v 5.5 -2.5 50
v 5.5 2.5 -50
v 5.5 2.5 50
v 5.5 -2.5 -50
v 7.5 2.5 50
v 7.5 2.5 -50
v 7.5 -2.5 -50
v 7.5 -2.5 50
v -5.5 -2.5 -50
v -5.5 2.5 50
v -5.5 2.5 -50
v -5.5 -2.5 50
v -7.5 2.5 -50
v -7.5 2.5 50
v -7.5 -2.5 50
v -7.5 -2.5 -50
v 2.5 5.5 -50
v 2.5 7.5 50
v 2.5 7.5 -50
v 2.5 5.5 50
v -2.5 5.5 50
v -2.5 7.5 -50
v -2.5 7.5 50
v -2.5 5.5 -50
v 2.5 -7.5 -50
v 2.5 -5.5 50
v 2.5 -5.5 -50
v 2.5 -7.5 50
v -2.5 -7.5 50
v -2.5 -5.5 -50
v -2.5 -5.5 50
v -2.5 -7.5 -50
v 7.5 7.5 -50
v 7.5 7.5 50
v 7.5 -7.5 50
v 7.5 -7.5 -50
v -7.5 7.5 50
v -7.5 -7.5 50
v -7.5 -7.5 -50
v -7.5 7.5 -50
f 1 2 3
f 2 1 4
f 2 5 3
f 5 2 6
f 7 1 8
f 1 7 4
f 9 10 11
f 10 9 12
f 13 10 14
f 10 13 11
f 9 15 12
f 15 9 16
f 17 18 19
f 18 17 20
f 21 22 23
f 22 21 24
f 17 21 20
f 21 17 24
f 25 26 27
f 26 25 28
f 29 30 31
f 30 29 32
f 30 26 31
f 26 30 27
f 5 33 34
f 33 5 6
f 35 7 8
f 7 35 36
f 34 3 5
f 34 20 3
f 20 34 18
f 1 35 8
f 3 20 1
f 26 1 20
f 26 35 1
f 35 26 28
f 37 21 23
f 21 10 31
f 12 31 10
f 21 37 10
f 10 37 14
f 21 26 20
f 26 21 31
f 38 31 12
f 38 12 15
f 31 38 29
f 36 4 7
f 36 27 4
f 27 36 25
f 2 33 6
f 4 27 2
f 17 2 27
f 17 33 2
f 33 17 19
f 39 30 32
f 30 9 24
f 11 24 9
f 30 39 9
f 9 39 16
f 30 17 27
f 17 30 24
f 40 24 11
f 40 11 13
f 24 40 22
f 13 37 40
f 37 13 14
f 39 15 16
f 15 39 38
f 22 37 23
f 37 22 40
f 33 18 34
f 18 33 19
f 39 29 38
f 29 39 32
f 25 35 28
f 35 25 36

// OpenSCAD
// 15x15 aluminium extrusion profile, 100mm long
// Robust, visible geometry: 15x15 outer with 4 shallow T-slot-like grooves

$fn = 32;

// Parameters (mm)
profile_W = 15.0;
profile_H = 15.0;
length_L  = 100.0;

// Groove parameters (kept conservative so the body remains clearly visible)
slot_depth = 2.0;   // how far the groove cuts in from each face
slot_width = 5.0;   // main groove width
slot_lip   = 2.0;   // narrower "lip" width near the outer face

eps = 0.05;         // small overlap for clean booleans

module extrusion_body() {
    cube([profile_W, profile_H, length_L], center=true);
}

// Cut a single face groove on +X or -X
module face_groove_x(sign=1) {
    // Place groove so its outer face is slightly outside the profile face (guaranteed cut)
    x_center = sign * (profile_W/2 - slot_depth/2 + eps/2);

    // Lip is closer to the outer face than the main slot
    lip_center = sign * (profile_W/2 - (slot_depth*0.35)/2 + eps/2);

    union() {
        // Main rectangular groove
        translate([x_center, 0, 0])
            cube([slot_depth + eps, slot_width, length_L + 2*eps], center=true);

        // Narrower lip near the opening
        translate([lip_center, 0, 0])
            cube([slot_depth*0.35 + eps, slot_lip, length_L + 2*eps], center=true);
    }
}

// Cut a single face groove on +Y or -Y
module face_groove_y(sign=1) {
    y_center = sign * (profile_H/2 - slot_depth/2 + eps/2);
    lip_center = sign * (profile_H/2 - (slot_depth*0.35)/2 + eps/2);

    union() {
        translate([0, y_center, 0])
            cube([slot_width, slot_depth + eps, length_L + 2*eps], center=true);

        translate([0, lip_center, 0])
            cube([slot_lip, slot_depth*0.35 + eps, length_L + 2*eps], center=true);
    }
}

module all_grooves() {
    union() {
        face_groove_x( 1);
        face_groove_x(-1);
        face_groove_y( 1);
        face_groove_y(-1);
    }
}

color("Silver")
difference() {
    extrusion_body();
    all_grooves();
}
